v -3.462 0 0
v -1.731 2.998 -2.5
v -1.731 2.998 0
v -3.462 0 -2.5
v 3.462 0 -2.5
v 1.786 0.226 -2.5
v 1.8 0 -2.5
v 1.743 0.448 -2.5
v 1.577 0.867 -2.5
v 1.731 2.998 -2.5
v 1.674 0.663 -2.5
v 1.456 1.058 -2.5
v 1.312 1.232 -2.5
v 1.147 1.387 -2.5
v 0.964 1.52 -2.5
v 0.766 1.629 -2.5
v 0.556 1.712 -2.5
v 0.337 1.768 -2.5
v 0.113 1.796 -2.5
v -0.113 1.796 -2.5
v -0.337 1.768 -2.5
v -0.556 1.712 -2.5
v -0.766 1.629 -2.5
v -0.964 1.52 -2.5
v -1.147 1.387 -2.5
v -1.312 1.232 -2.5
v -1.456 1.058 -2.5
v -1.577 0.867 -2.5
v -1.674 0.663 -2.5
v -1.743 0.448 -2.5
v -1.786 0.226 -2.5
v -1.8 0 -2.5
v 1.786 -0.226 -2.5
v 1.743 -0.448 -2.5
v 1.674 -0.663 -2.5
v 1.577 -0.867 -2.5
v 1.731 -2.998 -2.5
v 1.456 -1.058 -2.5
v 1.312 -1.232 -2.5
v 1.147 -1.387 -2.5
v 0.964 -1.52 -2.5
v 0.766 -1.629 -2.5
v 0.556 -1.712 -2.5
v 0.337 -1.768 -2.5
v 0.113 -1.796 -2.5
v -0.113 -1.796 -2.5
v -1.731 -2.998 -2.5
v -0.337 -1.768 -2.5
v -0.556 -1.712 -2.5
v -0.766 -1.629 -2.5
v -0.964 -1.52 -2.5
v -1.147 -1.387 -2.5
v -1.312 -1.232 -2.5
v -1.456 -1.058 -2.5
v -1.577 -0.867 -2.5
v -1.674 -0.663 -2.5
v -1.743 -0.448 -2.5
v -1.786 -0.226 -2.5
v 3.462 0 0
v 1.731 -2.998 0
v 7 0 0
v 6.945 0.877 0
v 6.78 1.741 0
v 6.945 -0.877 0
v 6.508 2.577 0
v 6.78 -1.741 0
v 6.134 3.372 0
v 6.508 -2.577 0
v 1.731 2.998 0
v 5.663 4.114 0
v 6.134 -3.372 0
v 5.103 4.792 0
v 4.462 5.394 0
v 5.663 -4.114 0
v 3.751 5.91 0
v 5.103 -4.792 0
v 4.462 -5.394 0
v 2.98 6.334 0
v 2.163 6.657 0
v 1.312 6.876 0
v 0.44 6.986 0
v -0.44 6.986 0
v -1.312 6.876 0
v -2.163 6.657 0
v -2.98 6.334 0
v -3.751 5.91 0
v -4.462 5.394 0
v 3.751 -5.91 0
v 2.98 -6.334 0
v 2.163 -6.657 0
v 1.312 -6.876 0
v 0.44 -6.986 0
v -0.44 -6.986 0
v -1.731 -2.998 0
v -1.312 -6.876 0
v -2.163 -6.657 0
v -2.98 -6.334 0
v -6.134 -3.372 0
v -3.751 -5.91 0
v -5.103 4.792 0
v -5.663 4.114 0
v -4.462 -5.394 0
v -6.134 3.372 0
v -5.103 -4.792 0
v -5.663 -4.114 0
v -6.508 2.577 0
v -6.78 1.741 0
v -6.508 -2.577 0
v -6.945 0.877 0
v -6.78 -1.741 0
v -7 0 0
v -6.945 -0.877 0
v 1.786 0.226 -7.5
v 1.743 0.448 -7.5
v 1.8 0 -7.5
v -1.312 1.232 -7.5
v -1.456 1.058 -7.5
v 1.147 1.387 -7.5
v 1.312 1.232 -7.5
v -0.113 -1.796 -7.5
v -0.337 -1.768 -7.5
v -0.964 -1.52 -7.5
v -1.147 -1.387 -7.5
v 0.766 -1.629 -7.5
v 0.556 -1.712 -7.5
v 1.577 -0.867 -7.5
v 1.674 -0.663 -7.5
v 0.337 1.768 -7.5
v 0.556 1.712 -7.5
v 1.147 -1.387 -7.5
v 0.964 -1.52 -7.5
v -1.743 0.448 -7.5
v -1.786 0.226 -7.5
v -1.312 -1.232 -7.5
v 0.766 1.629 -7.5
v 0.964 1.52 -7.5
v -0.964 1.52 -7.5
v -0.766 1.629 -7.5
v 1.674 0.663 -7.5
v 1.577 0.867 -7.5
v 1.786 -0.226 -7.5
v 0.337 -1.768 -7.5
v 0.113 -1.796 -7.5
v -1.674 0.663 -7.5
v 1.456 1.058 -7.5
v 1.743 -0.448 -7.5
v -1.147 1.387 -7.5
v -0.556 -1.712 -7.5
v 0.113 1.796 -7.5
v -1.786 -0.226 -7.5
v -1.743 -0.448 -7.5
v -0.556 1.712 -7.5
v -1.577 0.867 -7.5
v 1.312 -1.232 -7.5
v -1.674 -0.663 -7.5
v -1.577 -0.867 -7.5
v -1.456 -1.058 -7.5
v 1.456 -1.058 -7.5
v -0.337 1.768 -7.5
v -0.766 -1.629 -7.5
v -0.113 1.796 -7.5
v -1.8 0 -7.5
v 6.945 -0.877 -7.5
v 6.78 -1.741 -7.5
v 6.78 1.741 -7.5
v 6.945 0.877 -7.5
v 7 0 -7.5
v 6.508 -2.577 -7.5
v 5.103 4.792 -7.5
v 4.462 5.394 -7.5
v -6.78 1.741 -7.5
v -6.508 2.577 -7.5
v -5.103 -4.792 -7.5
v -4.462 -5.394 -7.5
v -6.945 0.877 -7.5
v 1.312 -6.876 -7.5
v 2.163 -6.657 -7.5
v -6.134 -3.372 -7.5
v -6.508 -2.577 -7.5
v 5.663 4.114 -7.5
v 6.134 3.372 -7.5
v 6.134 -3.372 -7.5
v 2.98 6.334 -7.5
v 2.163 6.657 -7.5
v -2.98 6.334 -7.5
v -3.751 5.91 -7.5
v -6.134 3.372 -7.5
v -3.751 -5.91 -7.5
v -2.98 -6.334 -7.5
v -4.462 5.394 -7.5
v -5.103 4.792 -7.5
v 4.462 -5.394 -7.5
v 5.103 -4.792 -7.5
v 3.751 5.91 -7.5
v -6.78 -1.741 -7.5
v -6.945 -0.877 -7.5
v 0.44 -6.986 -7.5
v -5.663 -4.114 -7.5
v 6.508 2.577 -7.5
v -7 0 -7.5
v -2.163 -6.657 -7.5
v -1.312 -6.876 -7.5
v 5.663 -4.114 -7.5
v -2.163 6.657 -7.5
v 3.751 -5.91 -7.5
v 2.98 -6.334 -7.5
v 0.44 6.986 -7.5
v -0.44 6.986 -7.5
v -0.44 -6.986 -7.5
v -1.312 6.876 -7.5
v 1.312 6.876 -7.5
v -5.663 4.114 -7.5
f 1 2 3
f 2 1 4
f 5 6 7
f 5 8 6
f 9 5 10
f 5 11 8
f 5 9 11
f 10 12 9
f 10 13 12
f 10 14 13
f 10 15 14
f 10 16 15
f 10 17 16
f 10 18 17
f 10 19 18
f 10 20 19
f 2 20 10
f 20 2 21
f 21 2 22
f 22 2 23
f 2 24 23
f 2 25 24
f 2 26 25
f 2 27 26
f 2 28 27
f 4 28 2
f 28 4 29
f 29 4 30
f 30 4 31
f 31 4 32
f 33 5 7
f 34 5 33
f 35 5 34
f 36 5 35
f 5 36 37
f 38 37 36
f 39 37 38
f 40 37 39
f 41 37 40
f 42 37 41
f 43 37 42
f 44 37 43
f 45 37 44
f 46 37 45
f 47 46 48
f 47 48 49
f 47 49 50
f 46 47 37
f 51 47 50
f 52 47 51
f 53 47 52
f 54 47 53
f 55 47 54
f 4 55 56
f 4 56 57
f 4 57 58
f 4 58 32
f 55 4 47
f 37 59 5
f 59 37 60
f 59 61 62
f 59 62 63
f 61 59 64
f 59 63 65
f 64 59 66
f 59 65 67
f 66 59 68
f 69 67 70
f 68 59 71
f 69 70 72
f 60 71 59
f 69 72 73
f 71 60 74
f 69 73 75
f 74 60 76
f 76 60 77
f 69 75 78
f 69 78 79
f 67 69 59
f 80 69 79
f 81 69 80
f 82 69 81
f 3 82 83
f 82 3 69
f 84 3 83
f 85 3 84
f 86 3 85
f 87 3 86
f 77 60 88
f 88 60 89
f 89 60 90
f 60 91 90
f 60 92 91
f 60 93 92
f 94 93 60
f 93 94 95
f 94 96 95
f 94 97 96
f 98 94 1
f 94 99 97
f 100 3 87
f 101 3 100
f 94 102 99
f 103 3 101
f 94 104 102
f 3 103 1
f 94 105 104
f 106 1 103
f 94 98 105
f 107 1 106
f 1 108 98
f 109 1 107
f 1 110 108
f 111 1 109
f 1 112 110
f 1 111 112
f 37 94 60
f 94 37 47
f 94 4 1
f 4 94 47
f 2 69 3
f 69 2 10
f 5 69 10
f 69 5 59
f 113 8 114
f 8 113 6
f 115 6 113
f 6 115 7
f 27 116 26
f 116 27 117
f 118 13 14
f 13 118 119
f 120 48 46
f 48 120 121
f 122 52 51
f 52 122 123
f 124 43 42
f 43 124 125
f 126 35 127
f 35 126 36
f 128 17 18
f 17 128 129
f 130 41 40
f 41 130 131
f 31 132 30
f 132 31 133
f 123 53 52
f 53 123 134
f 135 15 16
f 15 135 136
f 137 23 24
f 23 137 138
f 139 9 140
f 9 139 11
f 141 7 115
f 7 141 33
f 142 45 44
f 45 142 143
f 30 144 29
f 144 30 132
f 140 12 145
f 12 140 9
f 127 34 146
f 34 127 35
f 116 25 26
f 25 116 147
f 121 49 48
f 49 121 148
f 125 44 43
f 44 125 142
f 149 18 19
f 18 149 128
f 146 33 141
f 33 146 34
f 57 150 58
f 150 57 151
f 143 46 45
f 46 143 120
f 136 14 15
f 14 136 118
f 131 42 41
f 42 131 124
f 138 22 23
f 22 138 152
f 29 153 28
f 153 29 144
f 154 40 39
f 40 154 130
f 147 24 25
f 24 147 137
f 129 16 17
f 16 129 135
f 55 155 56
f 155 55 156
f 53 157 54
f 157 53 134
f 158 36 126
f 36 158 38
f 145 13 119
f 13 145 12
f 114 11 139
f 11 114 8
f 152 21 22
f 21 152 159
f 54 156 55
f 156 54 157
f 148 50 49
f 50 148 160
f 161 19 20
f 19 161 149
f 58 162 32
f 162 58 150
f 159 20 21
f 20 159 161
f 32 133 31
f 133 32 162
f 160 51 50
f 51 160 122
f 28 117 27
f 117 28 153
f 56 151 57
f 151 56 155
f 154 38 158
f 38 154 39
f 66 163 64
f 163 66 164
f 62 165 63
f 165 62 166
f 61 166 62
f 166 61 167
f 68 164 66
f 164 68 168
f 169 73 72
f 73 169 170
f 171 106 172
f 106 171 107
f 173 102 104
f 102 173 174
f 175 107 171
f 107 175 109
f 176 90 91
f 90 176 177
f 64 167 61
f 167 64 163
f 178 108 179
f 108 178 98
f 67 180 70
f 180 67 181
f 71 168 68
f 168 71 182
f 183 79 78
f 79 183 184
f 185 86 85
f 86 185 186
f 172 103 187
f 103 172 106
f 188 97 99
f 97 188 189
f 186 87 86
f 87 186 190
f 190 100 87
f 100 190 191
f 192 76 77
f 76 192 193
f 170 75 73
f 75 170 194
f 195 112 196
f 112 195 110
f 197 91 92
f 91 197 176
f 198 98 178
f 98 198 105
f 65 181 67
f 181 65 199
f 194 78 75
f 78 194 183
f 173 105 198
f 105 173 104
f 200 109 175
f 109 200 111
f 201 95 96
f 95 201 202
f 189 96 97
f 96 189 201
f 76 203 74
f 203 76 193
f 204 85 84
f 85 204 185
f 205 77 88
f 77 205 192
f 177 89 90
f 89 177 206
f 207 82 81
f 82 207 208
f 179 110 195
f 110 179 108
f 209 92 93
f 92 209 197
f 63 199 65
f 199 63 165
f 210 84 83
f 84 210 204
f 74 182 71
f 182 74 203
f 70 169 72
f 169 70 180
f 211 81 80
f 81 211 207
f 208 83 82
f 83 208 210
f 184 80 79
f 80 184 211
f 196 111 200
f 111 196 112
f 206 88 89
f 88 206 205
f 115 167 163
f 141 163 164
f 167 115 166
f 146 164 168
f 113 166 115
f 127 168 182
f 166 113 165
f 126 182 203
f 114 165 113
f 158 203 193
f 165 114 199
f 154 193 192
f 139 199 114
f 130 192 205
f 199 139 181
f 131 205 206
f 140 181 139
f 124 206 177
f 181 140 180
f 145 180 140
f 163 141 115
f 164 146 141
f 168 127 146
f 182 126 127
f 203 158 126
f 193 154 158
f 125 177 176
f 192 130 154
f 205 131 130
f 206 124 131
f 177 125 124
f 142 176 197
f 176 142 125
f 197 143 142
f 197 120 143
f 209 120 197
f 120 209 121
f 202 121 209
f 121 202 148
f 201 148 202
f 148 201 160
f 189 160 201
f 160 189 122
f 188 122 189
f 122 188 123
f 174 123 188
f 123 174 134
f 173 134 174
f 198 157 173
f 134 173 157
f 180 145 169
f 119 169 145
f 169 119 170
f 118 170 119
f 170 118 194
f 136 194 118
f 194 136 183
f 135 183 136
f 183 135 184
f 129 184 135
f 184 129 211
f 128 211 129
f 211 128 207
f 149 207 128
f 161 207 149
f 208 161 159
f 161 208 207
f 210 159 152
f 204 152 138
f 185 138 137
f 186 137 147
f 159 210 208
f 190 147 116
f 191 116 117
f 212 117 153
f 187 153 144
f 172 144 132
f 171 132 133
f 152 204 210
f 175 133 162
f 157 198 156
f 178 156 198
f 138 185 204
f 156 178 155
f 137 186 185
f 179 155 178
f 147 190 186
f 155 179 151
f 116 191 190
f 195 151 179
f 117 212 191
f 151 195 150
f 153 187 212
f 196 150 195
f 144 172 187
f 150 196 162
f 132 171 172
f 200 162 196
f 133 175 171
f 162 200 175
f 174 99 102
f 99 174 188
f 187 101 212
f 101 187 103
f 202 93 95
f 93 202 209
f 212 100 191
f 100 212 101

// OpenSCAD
$fn = 50;

difference() {
	union() {
		translate(v = [0, 0, -7.5]) {
			cylinder(h = 7.5, r = 7.0);
		}
	}
	union() {
		translate(v = [0, 0, 0]) {
			rotate(a = [0, 0, 0]) {
				difference() {
					union() {
						translate(v = [0, 0, -2.5]) {
							linear_extrude(height = 2.5) {
								polygon(points = [[3.4619999999999997, 0.0], [1.7310000000000003, 2.9981799479017264], [-1.7309999999999992, 2.9981799479017264], [-3.4619999999999997, 4.2397272186481365e-16], [-1.7310000000000014, -2.998179947901726], [1.7309999999999977, -2.9981799479017277]]);
							}
						}
					}
					union();
				}
			}
		}
		#translate(v = [0, 0, -100.0]) {
			cylinder(h = 200, r = 1.8);
		}
	}
}
